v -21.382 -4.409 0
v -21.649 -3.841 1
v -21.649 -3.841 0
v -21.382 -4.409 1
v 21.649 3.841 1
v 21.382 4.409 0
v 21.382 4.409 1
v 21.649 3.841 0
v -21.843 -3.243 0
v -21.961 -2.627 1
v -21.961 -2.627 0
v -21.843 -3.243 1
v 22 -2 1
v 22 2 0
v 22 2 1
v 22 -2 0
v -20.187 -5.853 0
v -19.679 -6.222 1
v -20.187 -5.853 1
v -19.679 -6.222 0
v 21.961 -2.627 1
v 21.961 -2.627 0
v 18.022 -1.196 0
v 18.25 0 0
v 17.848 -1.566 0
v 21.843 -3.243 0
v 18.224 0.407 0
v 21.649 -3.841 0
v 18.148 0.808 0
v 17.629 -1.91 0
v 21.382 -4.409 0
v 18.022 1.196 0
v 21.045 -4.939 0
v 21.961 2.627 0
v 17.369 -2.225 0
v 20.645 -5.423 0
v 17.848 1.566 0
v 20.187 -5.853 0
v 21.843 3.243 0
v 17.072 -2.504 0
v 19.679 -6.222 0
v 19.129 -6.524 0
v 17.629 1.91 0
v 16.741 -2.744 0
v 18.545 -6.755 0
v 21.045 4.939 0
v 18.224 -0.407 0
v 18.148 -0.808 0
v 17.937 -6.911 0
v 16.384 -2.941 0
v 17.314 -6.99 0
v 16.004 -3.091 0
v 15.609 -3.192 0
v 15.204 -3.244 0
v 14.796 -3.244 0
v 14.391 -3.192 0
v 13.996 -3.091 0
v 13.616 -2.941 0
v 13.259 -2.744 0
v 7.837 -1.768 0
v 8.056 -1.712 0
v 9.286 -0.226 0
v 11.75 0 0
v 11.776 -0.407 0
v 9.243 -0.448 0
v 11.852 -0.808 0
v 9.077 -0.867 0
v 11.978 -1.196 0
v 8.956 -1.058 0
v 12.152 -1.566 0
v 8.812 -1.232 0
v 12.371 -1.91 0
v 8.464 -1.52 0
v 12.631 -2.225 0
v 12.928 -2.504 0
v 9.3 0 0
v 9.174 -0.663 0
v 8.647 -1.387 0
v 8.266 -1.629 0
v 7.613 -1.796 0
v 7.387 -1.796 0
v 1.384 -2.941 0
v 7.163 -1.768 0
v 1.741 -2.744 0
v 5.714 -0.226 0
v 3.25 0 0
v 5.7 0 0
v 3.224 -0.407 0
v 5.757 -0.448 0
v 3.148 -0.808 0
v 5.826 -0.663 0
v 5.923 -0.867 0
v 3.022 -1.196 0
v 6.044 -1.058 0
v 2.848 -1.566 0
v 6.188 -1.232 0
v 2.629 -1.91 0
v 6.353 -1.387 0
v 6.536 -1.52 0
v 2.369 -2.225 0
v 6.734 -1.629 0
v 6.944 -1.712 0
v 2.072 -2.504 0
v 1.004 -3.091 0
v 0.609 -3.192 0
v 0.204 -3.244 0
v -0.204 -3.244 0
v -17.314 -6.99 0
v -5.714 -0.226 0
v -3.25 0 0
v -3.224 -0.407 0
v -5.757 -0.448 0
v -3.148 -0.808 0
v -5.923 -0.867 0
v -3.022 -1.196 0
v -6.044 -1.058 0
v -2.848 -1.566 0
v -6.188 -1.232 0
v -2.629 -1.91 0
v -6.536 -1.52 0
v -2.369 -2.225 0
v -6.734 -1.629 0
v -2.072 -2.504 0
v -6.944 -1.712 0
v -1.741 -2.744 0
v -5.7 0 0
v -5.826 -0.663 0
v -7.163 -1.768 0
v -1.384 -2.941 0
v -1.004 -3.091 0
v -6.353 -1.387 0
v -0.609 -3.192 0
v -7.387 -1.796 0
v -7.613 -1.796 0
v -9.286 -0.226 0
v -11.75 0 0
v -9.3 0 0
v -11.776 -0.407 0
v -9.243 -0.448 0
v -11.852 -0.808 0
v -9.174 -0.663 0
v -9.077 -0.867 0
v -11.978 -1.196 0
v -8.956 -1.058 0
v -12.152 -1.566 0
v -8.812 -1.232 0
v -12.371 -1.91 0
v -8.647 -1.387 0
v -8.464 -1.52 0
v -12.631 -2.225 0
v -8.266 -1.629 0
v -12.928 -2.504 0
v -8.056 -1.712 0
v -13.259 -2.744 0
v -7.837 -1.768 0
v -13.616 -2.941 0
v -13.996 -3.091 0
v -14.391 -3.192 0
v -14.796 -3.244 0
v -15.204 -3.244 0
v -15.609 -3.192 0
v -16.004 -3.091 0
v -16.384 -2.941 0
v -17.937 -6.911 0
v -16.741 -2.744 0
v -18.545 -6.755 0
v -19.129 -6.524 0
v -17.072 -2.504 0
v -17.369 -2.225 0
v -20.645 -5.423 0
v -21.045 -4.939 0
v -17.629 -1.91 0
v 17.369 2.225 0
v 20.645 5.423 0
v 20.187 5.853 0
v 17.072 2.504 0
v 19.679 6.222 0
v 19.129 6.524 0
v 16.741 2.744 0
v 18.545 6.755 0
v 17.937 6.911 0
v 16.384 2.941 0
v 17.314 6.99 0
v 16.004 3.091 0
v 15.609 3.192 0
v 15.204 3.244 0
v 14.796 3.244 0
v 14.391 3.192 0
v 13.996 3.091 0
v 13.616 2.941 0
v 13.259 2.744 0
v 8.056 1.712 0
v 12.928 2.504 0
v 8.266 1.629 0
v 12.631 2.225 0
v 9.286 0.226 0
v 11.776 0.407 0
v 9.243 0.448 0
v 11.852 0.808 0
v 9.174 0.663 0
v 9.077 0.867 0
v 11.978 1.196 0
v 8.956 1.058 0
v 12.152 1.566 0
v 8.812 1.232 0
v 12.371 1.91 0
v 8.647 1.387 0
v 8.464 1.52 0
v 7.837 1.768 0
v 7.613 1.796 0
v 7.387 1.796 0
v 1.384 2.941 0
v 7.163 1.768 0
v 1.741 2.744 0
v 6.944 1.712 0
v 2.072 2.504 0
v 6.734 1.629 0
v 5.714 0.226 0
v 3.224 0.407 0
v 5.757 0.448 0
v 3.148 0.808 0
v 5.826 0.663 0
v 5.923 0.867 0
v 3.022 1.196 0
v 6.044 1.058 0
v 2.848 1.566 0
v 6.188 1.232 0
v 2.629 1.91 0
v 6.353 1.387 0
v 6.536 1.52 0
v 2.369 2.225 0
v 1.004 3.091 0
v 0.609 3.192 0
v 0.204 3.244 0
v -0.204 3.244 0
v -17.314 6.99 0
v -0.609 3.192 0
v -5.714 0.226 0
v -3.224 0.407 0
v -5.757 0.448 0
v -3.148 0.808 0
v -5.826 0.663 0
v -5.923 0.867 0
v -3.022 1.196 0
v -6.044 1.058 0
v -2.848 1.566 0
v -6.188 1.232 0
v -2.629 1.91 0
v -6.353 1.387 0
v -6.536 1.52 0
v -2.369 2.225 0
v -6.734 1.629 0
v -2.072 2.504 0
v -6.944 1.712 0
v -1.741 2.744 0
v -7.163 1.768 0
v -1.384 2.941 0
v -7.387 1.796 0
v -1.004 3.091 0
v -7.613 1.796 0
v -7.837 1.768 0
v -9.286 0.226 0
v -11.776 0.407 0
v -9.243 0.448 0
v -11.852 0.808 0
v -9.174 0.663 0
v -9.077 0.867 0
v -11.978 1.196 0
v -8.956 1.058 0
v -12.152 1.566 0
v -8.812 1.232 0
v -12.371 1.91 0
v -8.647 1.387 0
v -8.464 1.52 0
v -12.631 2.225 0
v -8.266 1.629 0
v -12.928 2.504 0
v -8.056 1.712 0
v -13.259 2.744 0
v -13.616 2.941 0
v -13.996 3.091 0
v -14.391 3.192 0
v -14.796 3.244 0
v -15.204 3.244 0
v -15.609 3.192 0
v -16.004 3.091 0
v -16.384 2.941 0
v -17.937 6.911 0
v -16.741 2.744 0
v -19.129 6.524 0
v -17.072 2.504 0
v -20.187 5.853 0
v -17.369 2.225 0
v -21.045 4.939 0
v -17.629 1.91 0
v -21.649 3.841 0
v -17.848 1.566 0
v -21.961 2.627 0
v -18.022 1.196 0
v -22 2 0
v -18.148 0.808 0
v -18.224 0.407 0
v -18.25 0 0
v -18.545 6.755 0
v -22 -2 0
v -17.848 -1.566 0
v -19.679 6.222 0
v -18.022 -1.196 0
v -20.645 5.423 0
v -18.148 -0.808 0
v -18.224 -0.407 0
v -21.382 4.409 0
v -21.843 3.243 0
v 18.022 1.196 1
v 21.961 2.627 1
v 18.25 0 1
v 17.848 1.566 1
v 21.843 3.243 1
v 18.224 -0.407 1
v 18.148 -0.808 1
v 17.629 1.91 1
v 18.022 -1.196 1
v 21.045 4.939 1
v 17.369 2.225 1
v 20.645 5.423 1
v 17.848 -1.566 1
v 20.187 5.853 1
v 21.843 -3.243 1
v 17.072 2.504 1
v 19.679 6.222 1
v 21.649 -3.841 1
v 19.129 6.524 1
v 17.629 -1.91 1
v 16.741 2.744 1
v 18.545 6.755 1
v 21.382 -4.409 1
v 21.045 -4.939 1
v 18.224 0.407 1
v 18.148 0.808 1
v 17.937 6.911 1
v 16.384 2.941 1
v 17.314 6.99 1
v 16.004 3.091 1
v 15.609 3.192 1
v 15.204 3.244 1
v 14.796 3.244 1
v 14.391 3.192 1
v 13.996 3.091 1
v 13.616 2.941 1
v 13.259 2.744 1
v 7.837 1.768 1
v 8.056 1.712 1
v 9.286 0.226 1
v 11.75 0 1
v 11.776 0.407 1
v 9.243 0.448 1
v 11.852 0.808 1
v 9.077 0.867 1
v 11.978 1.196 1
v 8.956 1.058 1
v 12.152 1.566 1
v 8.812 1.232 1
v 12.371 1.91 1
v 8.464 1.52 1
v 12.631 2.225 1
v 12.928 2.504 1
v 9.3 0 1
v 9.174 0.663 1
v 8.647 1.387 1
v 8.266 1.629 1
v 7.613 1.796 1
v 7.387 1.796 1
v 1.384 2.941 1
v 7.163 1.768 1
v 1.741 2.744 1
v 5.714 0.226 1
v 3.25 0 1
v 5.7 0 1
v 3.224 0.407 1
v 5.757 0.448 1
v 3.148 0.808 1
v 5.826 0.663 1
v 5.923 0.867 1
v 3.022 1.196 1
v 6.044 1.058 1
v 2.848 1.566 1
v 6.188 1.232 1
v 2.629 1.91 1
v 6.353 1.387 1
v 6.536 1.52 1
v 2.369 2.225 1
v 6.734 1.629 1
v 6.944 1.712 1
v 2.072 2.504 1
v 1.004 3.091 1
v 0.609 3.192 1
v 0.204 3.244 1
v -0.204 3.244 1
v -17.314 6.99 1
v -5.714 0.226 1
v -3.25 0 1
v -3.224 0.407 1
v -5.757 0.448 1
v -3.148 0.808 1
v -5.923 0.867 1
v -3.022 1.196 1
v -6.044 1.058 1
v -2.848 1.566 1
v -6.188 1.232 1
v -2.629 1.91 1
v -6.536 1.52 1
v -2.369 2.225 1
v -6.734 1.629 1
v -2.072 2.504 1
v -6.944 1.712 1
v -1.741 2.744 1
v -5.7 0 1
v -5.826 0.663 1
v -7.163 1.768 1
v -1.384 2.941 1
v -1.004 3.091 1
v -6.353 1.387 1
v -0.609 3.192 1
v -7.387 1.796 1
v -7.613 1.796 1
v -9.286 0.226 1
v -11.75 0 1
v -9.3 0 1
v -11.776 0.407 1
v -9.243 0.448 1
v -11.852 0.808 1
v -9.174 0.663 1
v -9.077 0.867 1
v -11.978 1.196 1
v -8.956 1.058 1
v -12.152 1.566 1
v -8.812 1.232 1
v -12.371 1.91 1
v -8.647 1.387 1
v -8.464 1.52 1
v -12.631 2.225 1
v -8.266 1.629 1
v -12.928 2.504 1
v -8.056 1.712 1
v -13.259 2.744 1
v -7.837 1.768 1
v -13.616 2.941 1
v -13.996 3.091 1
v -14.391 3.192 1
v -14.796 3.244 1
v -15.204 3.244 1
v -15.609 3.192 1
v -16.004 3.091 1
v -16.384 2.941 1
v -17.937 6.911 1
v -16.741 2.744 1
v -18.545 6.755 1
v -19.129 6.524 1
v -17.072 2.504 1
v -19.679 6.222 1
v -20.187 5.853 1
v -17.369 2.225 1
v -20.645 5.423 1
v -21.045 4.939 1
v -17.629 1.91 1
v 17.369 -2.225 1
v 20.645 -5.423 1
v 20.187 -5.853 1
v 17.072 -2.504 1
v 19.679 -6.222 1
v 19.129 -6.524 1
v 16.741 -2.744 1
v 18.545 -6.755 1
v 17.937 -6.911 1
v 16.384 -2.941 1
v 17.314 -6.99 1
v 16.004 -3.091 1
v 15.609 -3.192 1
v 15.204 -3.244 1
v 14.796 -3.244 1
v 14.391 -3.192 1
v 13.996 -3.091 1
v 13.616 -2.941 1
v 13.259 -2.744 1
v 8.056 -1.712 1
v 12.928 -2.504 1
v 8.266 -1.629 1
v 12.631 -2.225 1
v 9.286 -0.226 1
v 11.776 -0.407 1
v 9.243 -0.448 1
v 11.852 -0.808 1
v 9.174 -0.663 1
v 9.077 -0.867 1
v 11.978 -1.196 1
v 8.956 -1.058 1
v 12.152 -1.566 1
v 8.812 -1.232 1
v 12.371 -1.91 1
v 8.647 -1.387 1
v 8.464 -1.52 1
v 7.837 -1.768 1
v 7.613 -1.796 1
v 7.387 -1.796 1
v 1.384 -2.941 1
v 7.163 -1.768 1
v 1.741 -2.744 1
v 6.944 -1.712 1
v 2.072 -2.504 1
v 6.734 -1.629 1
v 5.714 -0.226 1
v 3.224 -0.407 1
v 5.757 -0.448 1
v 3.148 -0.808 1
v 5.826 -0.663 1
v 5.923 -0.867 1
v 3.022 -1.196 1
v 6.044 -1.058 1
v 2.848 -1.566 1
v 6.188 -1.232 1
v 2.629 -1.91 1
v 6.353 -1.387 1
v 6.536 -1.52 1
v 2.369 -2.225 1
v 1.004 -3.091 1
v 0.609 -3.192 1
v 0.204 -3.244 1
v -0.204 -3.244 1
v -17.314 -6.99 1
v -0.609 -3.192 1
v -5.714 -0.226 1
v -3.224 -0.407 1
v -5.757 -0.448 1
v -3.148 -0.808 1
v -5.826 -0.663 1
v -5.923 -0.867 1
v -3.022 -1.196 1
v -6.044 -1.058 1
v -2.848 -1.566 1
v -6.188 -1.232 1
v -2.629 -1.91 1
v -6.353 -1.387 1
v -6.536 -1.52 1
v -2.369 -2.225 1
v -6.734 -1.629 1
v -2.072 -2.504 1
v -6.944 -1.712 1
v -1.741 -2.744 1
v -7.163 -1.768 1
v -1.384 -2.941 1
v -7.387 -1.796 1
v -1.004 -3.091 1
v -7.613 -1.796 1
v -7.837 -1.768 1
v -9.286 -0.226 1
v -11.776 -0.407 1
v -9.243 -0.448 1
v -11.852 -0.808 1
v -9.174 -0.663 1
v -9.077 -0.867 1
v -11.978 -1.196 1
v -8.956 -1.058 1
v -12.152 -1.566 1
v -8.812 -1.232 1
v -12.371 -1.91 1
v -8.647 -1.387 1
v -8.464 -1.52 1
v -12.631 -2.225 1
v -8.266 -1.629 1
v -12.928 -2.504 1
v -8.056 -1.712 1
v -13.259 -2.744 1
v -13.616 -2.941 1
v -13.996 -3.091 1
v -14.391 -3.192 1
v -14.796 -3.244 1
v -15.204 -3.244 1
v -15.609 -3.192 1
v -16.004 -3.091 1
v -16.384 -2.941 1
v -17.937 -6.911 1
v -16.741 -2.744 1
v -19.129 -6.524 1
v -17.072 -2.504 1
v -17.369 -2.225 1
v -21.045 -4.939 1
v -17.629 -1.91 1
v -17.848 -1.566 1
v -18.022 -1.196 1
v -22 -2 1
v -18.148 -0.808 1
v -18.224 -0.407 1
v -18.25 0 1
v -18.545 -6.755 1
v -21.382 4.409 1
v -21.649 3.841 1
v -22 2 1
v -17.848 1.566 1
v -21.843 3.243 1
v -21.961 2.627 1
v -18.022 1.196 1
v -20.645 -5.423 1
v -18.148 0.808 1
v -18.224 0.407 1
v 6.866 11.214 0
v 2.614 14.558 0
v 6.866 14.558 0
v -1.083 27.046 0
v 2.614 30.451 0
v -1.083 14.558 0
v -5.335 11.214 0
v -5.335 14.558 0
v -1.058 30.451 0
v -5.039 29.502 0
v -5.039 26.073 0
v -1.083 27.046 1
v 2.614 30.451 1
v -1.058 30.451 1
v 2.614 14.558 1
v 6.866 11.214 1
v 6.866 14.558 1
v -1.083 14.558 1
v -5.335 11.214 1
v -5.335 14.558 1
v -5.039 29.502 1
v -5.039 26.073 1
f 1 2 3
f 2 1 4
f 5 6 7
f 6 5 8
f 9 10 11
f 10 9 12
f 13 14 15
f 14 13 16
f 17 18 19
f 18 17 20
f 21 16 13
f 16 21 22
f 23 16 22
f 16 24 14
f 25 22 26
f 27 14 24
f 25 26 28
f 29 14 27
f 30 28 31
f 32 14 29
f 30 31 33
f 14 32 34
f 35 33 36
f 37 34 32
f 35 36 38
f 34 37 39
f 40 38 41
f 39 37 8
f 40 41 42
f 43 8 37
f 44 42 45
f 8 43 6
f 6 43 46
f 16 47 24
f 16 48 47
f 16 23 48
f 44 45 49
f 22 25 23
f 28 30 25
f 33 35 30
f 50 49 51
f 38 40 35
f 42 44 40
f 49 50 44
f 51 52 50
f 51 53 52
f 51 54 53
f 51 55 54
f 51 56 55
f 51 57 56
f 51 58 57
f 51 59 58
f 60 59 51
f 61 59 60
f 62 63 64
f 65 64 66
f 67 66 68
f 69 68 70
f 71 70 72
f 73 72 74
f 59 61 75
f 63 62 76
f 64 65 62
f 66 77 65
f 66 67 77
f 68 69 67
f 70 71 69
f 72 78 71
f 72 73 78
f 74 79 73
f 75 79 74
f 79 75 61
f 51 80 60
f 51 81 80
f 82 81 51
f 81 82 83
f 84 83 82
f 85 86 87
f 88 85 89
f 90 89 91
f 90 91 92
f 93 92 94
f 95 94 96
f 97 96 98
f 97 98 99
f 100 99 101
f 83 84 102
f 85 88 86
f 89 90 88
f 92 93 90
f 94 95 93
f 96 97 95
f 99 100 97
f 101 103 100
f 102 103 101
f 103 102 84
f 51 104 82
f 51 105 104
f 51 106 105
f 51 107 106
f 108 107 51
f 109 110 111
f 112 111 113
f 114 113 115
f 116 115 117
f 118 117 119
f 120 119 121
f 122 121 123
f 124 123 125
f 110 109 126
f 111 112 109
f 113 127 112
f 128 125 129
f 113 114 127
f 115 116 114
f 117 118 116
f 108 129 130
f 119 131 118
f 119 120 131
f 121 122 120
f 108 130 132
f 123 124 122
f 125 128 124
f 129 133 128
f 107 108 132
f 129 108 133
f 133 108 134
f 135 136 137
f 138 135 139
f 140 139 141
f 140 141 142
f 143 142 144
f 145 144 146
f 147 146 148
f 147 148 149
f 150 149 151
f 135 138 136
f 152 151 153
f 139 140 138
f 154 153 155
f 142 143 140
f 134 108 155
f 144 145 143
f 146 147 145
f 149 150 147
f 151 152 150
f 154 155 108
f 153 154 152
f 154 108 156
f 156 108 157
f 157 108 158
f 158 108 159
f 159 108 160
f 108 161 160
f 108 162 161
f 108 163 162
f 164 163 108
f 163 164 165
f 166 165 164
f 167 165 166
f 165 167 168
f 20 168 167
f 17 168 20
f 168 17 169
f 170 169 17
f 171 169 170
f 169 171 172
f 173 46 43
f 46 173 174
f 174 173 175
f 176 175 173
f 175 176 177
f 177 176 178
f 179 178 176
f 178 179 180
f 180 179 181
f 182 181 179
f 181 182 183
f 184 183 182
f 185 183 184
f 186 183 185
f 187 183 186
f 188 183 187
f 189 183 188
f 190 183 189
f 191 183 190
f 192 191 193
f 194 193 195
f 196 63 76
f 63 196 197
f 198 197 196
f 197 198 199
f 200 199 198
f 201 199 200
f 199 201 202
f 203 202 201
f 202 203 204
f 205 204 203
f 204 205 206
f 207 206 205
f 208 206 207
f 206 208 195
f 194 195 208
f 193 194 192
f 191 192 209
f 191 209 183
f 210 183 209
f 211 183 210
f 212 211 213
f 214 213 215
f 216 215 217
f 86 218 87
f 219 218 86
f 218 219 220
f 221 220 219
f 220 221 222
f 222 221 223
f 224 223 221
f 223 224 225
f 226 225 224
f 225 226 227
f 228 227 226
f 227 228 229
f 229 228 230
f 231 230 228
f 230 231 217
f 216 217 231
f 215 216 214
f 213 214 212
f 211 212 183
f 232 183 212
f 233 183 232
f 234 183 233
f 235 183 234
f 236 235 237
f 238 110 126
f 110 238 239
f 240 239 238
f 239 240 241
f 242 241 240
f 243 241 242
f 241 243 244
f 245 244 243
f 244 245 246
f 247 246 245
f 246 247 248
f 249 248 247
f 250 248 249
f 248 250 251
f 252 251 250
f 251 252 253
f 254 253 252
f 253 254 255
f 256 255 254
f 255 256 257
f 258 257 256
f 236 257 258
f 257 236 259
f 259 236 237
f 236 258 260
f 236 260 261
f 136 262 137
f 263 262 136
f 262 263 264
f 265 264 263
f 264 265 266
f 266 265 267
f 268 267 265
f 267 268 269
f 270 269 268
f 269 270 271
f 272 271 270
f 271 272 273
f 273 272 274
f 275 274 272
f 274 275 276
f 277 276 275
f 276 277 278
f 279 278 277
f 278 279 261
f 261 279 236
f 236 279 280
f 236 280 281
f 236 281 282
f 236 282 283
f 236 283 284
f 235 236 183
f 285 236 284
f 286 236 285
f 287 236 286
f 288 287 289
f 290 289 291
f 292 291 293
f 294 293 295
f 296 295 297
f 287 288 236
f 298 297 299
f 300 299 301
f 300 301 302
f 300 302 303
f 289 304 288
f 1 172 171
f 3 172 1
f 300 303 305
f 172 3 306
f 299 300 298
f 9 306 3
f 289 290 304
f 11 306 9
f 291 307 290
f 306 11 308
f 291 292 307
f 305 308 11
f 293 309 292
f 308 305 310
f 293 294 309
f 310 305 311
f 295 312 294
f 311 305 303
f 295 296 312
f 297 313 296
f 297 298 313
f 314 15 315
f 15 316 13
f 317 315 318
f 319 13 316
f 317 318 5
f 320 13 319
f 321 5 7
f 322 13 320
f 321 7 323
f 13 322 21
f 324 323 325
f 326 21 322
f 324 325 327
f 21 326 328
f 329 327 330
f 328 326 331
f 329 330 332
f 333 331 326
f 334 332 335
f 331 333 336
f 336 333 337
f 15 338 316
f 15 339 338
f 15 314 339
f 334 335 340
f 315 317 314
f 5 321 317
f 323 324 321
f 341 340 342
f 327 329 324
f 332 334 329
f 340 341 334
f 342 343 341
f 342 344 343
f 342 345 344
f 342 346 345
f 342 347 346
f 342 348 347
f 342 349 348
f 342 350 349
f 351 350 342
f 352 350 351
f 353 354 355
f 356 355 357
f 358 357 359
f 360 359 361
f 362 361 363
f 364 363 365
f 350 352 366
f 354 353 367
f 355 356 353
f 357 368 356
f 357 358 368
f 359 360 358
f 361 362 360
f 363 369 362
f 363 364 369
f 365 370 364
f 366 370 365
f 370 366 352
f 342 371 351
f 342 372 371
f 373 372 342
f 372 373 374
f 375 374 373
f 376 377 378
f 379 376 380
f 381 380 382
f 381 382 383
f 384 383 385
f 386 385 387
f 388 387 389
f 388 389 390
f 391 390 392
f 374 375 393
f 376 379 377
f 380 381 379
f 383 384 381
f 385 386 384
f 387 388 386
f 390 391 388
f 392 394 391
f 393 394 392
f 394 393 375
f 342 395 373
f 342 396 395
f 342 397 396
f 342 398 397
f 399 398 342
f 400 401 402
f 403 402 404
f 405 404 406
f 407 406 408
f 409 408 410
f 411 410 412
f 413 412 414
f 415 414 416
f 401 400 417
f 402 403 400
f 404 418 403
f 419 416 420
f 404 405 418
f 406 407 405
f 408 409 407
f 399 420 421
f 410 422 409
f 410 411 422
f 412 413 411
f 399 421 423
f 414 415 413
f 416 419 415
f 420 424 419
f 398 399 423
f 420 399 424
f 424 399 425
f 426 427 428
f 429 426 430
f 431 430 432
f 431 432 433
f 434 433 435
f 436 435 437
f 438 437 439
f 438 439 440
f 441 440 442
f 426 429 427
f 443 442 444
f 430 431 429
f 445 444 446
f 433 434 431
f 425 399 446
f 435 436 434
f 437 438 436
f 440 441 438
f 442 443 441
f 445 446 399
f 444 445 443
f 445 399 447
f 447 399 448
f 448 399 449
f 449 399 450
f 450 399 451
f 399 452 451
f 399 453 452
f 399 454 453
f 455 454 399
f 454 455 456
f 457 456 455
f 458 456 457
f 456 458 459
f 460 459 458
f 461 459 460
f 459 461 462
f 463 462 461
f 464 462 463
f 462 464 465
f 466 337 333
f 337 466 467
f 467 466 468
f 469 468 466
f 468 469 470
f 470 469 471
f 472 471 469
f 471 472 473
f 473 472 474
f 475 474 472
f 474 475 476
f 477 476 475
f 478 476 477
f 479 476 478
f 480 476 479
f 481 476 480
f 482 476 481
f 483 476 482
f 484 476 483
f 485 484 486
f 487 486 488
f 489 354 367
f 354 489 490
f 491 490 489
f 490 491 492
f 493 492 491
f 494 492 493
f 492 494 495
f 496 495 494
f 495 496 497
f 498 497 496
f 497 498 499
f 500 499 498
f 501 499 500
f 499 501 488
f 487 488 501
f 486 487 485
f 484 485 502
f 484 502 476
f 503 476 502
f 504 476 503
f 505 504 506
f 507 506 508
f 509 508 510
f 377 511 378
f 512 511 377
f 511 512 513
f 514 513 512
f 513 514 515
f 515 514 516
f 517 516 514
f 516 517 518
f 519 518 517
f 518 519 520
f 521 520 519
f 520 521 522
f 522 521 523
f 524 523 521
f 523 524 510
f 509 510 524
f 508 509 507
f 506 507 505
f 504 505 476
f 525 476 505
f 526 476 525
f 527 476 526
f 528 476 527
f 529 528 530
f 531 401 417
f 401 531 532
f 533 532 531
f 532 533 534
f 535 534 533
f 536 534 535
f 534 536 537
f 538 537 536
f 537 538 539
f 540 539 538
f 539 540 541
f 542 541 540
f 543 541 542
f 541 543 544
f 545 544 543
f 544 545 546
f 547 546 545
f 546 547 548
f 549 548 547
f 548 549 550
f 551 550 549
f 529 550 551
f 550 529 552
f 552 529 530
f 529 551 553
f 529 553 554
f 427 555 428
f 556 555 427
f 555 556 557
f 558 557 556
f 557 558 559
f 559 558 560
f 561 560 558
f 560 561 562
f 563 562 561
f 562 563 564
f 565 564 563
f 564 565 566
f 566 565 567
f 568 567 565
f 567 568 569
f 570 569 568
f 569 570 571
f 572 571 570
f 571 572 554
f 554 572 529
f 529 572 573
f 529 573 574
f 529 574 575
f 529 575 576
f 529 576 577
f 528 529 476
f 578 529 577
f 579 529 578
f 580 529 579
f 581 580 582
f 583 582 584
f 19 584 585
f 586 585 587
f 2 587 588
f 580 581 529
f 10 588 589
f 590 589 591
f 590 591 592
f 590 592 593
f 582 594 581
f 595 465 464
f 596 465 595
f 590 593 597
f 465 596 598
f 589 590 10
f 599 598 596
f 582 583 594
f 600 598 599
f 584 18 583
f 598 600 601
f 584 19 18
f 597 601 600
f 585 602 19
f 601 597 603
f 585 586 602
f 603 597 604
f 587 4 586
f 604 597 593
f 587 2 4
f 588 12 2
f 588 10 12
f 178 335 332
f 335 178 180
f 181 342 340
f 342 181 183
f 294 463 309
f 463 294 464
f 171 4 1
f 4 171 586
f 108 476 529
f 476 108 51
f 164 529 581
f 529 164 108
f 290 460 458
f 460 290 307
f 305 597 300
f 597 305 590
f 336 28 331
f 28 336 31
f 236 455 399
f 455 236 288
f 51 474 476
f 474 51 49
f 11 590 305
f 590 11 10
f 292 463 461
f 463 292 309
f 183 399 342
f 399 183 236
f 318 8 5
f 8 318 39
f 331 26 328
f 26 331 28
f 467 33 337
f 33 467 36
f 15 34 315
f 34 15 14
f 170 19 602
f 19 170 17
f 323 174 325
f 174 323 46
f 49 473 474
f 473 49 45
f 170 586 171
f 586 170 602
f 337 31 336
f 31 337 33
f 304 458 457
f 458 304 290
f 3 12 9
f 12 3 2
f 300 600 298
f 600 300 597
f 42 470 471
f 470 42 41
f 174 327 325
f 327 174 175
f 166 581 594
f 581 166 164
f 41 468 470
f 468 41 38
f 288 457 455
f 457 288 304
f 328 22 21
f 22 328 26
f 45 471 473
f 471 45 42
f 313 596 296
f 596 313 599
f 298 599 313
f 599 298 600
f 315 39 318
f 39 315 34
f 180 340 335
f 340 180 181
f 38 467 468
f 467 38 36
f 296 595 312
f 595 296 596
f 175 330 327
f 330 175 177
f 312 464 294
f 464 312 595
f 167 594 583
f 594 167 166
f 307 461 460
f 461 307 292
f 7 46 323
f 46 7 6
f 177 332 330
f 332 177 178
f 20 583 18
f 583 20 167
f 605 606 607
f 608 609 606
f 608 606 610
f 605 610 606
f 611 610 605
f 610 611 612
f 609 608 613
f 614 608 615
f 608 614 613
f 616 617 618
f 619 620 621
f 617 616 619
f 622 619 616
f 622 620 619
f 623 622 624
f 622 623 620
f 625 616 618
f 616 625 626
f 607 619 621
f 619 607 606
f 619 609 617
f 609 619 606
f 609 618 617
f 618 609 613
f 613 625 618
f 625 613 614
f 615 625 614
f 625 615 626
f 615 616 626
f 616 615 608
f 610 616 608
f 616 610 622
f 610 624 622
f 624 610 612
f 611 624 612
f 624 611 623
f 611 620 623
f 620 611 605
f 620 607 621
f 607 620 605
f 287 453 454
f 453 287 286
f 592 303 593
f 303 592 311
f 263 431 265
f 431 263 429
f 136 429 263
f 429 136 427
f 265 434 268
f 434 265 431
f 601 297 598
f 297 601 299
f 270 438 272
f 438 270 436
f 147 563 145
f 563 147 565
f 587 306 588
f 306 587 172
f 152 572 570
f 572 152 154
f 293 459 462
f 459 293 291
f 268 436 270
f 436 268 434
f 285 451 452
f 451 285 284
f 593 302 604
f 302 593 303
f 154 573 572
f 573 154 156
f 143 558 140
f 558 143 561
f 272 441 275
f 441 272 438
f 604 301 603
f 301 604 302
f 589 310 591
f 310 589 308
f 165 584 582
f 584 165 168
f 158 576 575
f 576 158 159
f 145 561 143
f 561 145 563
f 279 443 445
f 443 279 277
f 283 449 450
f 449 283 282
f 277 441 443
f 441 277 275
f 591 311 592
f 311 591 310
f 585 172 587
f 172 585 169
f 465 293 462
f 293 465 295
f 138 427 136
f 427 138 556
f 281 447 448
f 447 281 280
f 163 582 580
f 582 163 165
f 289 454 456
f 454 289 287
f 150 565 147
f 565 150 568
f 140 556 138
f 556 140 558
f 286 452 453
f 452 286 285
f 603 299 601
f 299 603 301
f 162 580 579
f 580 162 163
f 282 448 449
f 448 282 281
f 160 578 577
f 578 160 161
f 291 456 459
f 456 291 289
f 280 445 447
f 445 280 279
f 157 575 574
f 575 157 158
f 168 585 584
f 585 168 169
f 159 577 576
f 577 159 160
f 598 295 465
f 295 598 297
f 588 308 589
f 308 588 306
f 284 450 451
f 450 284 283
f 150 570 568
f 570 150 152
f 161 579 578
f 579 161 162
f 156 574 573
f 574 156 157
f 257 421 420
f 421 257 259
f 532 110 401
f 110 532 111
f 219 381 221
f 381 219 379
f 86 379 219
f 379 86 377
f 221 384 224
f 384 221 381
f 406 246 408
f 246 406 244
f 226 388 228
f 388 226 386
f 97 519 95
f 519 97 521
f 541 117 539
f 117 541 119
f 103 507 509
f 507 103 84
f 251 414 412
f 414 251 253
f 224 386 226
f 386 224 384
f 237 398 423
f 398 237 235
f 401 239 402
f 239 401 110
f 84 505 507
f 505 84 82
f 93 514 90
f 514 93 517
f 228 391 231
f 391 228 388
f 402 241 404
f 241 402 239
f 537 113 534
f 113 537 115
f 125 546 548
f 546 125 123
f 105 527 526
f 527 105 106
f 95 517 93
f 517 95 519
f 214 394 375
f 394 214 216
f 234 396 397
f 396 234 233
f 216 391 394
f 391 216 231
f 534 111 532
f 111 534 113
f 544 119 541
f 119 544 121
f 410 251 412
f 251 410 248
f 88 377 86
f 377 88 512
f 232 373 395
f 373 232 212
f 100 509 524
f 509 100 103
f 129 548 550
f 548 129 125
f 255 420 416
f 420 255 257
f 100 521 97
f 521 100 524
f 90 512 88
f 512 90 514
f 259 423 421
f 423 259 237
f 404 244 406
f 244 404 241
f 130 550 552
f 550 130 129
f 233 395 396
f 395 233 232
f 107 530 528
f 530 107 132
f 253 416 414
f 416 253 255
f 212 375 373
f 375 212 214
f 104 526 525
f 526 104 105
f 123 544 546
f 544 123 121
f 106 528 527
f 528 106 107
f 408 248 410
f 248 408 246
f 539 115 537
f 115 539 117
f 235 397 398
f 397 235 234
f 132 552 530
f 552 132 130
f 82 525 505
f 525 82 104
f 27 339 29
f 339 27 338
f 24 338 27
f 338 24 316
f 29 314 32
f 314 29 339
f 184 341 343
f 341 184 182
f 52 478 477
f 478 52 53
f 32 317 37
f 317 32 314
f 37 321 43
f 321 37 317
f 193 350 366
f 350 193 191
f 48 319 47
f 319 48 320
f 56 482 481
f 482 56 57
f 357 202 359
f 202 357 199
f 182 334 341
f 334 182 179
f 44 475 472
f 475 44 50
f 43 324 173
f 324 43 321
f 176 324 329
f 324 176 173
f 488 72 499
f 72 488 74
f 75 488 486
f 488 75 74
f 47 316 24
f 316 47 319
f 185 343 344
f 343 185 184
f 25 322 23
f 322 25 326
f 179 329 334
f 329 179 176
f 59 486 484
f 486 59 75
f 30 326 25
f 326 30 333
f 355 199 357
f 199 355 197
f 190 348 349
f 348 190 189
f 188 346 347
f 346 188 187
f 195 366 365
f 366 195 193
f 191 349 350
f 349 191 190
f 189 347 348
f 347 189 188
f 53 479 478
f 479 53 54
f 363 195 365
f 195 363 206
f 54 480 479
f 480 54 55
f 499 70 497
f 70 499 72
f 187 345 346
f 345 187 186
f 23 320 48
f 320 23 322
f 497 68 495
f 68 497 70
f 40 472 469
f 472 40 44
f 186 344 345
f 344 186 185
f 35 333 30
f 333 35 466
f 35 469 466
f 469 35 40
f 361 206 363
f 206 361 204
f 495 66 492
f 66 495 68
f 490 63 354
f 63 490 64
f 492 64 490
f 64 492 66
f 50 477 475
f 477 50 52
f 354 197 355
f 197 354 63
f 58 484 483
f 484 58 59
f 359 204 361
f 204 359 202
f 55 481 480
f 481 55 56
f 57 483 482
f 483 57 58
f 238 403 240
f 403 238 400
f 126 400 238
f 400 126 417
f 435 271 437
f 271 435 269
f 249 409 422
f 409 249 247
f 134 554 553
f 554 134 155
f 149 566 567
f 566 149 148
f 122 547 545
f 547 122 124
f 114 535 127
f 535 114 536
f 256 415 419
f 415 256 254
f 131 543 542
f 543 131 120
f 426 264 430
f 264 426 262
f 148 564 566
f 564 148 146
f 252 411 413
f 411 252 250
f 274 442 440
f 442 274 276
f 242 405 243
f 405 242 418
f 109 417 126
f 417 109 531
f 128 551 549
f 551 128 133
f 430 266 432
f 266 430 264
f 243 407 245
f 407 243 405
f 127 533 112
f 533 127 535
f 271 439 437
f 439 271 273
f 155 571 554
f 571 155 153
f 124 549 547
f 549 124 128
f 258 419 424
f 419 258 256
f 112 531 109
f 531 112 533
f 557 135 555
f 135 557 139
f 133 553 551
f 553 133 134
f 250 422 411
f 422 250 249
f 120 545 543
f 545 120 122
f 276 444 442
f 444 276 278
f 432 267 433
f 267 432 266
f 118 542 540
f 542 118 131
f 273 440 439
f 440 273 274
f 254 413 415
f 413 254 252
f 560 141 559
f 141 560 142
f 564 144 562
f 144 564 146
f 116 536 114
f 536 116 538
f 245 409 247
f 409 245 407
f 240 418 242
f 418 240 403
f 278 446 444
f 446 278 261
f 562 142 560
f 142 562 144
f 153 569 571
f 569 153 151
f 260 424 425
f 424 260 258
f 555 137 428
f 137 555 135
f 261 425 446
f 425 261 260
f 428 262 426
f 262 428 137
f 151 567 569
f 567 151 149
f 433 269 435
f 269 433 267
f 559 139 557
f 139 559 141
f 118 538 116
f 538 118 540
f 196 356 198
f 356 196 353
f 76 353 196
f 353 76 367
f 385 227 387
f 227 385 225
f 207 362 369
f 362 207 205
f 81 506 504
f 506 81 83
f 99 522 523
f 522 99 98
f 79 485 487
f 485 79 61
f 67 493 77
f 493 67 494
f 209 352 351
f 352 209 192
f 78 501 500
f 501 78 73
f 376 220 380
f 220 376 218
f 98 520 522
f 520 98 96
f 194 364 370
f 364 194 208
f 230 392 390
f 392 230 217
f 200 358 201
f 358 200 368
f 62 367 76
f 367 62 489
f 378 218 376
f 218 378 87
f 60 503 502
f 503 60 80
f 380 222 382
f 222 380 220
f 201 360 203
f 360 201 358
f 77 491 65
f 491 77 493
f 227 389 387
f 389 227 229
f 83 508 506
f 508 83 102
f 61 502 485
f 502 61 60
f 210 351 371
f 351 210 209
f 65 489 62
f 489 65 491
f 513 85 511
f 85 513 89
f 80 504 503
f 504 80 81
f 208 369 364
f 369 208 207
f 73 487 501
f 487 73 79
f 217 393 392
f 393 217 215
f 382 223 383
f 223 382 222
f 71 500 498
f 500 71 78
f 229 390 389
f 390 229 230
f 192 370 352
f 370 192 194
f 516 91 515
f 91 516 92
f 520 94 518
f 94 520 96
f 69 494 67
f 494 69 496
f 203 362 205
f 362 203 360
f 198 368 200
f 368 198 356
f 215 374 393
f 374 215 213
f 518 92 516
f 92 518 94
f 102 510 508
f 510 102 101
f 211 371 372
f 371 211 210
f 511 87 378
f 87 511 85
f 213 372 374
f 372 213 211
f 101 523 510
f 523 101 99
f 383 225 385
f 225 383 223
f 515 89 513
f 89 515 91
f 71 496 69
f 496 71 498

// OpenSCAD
$fn = 50;


difference() {
	union() {
		hull() {
			translate(v = [-17.0000000000, 2.0000000000, 0]) {
				cylinder(h = 1, r = 5);
			}
			translate(v = [17.0000000000, 2.0000000000, 0]) {
				cylinder(h = 1, r = 5);
			}
			translate(v = [-17.0000000000, -2.0000000000, 0]) {
				cylinder(h = 1, r = 5);
			}
			translate(v = [17.0000000000, -2.0000000000, 0]) {
				cylinder(h = 1, r = 5);
			}
		}
		translate(v = [0, 30.0000000000, 0]) {
			linear_extrude(height = 1) {
				text(font = "DejaVu Sans Mono:style=Bold", halign = "center", size = 19.0000000000, text = "1", valign = "top");
			}
		}
	}
	union() {
		translate(v = [-15.0000000000, 0.0000000000, 0]) {
			translate(v = [0, 0, -100]) {
				cylinder(h = 200, r = 3.2500000000);
			}
		}
		translate(v = [0, 0, -100]) {
			cylinder(h = 200, r = 3.2500000000);
		}
		translate(v = [15.0000000000, 0.0000000000, 0]) {
			translate(v = [0, 0, -100]) {
				cylinder(h = 200, r = 3.2500000000);
			}
		}
		translate(v = [-15.0000000000, 0.0000000000, 0]) {
			translate(v = [0, 0, -100]) {
				cylinder(h = 200, r = 1.8000000000);
			}
		}
		translate(v = [-7.5000000000, 0.0000000000, 0]) {
			translate(v = [0, 0, -100]) {
				cylinder(h = 200, r = 1.8000000000);
			}
		}
		translate(v = [0, 0, -100]) {
			cylinder(h = 200, r = 1.8000000000);
		}
		translate(v = [7.5000000000, 0.0000000000, 0]) {
			translate(v = [0, 0, -100]) {
				cylinder(h = 200, r = 1.8000000000);
			}
		}
		translate(v = [15.0000000000, 0.0000000000, 0]) {
			translate(v = [0, 0, -100]) {
				cylinder(h = 200, r = 1.8000000000);
			}
		}
	}
}
